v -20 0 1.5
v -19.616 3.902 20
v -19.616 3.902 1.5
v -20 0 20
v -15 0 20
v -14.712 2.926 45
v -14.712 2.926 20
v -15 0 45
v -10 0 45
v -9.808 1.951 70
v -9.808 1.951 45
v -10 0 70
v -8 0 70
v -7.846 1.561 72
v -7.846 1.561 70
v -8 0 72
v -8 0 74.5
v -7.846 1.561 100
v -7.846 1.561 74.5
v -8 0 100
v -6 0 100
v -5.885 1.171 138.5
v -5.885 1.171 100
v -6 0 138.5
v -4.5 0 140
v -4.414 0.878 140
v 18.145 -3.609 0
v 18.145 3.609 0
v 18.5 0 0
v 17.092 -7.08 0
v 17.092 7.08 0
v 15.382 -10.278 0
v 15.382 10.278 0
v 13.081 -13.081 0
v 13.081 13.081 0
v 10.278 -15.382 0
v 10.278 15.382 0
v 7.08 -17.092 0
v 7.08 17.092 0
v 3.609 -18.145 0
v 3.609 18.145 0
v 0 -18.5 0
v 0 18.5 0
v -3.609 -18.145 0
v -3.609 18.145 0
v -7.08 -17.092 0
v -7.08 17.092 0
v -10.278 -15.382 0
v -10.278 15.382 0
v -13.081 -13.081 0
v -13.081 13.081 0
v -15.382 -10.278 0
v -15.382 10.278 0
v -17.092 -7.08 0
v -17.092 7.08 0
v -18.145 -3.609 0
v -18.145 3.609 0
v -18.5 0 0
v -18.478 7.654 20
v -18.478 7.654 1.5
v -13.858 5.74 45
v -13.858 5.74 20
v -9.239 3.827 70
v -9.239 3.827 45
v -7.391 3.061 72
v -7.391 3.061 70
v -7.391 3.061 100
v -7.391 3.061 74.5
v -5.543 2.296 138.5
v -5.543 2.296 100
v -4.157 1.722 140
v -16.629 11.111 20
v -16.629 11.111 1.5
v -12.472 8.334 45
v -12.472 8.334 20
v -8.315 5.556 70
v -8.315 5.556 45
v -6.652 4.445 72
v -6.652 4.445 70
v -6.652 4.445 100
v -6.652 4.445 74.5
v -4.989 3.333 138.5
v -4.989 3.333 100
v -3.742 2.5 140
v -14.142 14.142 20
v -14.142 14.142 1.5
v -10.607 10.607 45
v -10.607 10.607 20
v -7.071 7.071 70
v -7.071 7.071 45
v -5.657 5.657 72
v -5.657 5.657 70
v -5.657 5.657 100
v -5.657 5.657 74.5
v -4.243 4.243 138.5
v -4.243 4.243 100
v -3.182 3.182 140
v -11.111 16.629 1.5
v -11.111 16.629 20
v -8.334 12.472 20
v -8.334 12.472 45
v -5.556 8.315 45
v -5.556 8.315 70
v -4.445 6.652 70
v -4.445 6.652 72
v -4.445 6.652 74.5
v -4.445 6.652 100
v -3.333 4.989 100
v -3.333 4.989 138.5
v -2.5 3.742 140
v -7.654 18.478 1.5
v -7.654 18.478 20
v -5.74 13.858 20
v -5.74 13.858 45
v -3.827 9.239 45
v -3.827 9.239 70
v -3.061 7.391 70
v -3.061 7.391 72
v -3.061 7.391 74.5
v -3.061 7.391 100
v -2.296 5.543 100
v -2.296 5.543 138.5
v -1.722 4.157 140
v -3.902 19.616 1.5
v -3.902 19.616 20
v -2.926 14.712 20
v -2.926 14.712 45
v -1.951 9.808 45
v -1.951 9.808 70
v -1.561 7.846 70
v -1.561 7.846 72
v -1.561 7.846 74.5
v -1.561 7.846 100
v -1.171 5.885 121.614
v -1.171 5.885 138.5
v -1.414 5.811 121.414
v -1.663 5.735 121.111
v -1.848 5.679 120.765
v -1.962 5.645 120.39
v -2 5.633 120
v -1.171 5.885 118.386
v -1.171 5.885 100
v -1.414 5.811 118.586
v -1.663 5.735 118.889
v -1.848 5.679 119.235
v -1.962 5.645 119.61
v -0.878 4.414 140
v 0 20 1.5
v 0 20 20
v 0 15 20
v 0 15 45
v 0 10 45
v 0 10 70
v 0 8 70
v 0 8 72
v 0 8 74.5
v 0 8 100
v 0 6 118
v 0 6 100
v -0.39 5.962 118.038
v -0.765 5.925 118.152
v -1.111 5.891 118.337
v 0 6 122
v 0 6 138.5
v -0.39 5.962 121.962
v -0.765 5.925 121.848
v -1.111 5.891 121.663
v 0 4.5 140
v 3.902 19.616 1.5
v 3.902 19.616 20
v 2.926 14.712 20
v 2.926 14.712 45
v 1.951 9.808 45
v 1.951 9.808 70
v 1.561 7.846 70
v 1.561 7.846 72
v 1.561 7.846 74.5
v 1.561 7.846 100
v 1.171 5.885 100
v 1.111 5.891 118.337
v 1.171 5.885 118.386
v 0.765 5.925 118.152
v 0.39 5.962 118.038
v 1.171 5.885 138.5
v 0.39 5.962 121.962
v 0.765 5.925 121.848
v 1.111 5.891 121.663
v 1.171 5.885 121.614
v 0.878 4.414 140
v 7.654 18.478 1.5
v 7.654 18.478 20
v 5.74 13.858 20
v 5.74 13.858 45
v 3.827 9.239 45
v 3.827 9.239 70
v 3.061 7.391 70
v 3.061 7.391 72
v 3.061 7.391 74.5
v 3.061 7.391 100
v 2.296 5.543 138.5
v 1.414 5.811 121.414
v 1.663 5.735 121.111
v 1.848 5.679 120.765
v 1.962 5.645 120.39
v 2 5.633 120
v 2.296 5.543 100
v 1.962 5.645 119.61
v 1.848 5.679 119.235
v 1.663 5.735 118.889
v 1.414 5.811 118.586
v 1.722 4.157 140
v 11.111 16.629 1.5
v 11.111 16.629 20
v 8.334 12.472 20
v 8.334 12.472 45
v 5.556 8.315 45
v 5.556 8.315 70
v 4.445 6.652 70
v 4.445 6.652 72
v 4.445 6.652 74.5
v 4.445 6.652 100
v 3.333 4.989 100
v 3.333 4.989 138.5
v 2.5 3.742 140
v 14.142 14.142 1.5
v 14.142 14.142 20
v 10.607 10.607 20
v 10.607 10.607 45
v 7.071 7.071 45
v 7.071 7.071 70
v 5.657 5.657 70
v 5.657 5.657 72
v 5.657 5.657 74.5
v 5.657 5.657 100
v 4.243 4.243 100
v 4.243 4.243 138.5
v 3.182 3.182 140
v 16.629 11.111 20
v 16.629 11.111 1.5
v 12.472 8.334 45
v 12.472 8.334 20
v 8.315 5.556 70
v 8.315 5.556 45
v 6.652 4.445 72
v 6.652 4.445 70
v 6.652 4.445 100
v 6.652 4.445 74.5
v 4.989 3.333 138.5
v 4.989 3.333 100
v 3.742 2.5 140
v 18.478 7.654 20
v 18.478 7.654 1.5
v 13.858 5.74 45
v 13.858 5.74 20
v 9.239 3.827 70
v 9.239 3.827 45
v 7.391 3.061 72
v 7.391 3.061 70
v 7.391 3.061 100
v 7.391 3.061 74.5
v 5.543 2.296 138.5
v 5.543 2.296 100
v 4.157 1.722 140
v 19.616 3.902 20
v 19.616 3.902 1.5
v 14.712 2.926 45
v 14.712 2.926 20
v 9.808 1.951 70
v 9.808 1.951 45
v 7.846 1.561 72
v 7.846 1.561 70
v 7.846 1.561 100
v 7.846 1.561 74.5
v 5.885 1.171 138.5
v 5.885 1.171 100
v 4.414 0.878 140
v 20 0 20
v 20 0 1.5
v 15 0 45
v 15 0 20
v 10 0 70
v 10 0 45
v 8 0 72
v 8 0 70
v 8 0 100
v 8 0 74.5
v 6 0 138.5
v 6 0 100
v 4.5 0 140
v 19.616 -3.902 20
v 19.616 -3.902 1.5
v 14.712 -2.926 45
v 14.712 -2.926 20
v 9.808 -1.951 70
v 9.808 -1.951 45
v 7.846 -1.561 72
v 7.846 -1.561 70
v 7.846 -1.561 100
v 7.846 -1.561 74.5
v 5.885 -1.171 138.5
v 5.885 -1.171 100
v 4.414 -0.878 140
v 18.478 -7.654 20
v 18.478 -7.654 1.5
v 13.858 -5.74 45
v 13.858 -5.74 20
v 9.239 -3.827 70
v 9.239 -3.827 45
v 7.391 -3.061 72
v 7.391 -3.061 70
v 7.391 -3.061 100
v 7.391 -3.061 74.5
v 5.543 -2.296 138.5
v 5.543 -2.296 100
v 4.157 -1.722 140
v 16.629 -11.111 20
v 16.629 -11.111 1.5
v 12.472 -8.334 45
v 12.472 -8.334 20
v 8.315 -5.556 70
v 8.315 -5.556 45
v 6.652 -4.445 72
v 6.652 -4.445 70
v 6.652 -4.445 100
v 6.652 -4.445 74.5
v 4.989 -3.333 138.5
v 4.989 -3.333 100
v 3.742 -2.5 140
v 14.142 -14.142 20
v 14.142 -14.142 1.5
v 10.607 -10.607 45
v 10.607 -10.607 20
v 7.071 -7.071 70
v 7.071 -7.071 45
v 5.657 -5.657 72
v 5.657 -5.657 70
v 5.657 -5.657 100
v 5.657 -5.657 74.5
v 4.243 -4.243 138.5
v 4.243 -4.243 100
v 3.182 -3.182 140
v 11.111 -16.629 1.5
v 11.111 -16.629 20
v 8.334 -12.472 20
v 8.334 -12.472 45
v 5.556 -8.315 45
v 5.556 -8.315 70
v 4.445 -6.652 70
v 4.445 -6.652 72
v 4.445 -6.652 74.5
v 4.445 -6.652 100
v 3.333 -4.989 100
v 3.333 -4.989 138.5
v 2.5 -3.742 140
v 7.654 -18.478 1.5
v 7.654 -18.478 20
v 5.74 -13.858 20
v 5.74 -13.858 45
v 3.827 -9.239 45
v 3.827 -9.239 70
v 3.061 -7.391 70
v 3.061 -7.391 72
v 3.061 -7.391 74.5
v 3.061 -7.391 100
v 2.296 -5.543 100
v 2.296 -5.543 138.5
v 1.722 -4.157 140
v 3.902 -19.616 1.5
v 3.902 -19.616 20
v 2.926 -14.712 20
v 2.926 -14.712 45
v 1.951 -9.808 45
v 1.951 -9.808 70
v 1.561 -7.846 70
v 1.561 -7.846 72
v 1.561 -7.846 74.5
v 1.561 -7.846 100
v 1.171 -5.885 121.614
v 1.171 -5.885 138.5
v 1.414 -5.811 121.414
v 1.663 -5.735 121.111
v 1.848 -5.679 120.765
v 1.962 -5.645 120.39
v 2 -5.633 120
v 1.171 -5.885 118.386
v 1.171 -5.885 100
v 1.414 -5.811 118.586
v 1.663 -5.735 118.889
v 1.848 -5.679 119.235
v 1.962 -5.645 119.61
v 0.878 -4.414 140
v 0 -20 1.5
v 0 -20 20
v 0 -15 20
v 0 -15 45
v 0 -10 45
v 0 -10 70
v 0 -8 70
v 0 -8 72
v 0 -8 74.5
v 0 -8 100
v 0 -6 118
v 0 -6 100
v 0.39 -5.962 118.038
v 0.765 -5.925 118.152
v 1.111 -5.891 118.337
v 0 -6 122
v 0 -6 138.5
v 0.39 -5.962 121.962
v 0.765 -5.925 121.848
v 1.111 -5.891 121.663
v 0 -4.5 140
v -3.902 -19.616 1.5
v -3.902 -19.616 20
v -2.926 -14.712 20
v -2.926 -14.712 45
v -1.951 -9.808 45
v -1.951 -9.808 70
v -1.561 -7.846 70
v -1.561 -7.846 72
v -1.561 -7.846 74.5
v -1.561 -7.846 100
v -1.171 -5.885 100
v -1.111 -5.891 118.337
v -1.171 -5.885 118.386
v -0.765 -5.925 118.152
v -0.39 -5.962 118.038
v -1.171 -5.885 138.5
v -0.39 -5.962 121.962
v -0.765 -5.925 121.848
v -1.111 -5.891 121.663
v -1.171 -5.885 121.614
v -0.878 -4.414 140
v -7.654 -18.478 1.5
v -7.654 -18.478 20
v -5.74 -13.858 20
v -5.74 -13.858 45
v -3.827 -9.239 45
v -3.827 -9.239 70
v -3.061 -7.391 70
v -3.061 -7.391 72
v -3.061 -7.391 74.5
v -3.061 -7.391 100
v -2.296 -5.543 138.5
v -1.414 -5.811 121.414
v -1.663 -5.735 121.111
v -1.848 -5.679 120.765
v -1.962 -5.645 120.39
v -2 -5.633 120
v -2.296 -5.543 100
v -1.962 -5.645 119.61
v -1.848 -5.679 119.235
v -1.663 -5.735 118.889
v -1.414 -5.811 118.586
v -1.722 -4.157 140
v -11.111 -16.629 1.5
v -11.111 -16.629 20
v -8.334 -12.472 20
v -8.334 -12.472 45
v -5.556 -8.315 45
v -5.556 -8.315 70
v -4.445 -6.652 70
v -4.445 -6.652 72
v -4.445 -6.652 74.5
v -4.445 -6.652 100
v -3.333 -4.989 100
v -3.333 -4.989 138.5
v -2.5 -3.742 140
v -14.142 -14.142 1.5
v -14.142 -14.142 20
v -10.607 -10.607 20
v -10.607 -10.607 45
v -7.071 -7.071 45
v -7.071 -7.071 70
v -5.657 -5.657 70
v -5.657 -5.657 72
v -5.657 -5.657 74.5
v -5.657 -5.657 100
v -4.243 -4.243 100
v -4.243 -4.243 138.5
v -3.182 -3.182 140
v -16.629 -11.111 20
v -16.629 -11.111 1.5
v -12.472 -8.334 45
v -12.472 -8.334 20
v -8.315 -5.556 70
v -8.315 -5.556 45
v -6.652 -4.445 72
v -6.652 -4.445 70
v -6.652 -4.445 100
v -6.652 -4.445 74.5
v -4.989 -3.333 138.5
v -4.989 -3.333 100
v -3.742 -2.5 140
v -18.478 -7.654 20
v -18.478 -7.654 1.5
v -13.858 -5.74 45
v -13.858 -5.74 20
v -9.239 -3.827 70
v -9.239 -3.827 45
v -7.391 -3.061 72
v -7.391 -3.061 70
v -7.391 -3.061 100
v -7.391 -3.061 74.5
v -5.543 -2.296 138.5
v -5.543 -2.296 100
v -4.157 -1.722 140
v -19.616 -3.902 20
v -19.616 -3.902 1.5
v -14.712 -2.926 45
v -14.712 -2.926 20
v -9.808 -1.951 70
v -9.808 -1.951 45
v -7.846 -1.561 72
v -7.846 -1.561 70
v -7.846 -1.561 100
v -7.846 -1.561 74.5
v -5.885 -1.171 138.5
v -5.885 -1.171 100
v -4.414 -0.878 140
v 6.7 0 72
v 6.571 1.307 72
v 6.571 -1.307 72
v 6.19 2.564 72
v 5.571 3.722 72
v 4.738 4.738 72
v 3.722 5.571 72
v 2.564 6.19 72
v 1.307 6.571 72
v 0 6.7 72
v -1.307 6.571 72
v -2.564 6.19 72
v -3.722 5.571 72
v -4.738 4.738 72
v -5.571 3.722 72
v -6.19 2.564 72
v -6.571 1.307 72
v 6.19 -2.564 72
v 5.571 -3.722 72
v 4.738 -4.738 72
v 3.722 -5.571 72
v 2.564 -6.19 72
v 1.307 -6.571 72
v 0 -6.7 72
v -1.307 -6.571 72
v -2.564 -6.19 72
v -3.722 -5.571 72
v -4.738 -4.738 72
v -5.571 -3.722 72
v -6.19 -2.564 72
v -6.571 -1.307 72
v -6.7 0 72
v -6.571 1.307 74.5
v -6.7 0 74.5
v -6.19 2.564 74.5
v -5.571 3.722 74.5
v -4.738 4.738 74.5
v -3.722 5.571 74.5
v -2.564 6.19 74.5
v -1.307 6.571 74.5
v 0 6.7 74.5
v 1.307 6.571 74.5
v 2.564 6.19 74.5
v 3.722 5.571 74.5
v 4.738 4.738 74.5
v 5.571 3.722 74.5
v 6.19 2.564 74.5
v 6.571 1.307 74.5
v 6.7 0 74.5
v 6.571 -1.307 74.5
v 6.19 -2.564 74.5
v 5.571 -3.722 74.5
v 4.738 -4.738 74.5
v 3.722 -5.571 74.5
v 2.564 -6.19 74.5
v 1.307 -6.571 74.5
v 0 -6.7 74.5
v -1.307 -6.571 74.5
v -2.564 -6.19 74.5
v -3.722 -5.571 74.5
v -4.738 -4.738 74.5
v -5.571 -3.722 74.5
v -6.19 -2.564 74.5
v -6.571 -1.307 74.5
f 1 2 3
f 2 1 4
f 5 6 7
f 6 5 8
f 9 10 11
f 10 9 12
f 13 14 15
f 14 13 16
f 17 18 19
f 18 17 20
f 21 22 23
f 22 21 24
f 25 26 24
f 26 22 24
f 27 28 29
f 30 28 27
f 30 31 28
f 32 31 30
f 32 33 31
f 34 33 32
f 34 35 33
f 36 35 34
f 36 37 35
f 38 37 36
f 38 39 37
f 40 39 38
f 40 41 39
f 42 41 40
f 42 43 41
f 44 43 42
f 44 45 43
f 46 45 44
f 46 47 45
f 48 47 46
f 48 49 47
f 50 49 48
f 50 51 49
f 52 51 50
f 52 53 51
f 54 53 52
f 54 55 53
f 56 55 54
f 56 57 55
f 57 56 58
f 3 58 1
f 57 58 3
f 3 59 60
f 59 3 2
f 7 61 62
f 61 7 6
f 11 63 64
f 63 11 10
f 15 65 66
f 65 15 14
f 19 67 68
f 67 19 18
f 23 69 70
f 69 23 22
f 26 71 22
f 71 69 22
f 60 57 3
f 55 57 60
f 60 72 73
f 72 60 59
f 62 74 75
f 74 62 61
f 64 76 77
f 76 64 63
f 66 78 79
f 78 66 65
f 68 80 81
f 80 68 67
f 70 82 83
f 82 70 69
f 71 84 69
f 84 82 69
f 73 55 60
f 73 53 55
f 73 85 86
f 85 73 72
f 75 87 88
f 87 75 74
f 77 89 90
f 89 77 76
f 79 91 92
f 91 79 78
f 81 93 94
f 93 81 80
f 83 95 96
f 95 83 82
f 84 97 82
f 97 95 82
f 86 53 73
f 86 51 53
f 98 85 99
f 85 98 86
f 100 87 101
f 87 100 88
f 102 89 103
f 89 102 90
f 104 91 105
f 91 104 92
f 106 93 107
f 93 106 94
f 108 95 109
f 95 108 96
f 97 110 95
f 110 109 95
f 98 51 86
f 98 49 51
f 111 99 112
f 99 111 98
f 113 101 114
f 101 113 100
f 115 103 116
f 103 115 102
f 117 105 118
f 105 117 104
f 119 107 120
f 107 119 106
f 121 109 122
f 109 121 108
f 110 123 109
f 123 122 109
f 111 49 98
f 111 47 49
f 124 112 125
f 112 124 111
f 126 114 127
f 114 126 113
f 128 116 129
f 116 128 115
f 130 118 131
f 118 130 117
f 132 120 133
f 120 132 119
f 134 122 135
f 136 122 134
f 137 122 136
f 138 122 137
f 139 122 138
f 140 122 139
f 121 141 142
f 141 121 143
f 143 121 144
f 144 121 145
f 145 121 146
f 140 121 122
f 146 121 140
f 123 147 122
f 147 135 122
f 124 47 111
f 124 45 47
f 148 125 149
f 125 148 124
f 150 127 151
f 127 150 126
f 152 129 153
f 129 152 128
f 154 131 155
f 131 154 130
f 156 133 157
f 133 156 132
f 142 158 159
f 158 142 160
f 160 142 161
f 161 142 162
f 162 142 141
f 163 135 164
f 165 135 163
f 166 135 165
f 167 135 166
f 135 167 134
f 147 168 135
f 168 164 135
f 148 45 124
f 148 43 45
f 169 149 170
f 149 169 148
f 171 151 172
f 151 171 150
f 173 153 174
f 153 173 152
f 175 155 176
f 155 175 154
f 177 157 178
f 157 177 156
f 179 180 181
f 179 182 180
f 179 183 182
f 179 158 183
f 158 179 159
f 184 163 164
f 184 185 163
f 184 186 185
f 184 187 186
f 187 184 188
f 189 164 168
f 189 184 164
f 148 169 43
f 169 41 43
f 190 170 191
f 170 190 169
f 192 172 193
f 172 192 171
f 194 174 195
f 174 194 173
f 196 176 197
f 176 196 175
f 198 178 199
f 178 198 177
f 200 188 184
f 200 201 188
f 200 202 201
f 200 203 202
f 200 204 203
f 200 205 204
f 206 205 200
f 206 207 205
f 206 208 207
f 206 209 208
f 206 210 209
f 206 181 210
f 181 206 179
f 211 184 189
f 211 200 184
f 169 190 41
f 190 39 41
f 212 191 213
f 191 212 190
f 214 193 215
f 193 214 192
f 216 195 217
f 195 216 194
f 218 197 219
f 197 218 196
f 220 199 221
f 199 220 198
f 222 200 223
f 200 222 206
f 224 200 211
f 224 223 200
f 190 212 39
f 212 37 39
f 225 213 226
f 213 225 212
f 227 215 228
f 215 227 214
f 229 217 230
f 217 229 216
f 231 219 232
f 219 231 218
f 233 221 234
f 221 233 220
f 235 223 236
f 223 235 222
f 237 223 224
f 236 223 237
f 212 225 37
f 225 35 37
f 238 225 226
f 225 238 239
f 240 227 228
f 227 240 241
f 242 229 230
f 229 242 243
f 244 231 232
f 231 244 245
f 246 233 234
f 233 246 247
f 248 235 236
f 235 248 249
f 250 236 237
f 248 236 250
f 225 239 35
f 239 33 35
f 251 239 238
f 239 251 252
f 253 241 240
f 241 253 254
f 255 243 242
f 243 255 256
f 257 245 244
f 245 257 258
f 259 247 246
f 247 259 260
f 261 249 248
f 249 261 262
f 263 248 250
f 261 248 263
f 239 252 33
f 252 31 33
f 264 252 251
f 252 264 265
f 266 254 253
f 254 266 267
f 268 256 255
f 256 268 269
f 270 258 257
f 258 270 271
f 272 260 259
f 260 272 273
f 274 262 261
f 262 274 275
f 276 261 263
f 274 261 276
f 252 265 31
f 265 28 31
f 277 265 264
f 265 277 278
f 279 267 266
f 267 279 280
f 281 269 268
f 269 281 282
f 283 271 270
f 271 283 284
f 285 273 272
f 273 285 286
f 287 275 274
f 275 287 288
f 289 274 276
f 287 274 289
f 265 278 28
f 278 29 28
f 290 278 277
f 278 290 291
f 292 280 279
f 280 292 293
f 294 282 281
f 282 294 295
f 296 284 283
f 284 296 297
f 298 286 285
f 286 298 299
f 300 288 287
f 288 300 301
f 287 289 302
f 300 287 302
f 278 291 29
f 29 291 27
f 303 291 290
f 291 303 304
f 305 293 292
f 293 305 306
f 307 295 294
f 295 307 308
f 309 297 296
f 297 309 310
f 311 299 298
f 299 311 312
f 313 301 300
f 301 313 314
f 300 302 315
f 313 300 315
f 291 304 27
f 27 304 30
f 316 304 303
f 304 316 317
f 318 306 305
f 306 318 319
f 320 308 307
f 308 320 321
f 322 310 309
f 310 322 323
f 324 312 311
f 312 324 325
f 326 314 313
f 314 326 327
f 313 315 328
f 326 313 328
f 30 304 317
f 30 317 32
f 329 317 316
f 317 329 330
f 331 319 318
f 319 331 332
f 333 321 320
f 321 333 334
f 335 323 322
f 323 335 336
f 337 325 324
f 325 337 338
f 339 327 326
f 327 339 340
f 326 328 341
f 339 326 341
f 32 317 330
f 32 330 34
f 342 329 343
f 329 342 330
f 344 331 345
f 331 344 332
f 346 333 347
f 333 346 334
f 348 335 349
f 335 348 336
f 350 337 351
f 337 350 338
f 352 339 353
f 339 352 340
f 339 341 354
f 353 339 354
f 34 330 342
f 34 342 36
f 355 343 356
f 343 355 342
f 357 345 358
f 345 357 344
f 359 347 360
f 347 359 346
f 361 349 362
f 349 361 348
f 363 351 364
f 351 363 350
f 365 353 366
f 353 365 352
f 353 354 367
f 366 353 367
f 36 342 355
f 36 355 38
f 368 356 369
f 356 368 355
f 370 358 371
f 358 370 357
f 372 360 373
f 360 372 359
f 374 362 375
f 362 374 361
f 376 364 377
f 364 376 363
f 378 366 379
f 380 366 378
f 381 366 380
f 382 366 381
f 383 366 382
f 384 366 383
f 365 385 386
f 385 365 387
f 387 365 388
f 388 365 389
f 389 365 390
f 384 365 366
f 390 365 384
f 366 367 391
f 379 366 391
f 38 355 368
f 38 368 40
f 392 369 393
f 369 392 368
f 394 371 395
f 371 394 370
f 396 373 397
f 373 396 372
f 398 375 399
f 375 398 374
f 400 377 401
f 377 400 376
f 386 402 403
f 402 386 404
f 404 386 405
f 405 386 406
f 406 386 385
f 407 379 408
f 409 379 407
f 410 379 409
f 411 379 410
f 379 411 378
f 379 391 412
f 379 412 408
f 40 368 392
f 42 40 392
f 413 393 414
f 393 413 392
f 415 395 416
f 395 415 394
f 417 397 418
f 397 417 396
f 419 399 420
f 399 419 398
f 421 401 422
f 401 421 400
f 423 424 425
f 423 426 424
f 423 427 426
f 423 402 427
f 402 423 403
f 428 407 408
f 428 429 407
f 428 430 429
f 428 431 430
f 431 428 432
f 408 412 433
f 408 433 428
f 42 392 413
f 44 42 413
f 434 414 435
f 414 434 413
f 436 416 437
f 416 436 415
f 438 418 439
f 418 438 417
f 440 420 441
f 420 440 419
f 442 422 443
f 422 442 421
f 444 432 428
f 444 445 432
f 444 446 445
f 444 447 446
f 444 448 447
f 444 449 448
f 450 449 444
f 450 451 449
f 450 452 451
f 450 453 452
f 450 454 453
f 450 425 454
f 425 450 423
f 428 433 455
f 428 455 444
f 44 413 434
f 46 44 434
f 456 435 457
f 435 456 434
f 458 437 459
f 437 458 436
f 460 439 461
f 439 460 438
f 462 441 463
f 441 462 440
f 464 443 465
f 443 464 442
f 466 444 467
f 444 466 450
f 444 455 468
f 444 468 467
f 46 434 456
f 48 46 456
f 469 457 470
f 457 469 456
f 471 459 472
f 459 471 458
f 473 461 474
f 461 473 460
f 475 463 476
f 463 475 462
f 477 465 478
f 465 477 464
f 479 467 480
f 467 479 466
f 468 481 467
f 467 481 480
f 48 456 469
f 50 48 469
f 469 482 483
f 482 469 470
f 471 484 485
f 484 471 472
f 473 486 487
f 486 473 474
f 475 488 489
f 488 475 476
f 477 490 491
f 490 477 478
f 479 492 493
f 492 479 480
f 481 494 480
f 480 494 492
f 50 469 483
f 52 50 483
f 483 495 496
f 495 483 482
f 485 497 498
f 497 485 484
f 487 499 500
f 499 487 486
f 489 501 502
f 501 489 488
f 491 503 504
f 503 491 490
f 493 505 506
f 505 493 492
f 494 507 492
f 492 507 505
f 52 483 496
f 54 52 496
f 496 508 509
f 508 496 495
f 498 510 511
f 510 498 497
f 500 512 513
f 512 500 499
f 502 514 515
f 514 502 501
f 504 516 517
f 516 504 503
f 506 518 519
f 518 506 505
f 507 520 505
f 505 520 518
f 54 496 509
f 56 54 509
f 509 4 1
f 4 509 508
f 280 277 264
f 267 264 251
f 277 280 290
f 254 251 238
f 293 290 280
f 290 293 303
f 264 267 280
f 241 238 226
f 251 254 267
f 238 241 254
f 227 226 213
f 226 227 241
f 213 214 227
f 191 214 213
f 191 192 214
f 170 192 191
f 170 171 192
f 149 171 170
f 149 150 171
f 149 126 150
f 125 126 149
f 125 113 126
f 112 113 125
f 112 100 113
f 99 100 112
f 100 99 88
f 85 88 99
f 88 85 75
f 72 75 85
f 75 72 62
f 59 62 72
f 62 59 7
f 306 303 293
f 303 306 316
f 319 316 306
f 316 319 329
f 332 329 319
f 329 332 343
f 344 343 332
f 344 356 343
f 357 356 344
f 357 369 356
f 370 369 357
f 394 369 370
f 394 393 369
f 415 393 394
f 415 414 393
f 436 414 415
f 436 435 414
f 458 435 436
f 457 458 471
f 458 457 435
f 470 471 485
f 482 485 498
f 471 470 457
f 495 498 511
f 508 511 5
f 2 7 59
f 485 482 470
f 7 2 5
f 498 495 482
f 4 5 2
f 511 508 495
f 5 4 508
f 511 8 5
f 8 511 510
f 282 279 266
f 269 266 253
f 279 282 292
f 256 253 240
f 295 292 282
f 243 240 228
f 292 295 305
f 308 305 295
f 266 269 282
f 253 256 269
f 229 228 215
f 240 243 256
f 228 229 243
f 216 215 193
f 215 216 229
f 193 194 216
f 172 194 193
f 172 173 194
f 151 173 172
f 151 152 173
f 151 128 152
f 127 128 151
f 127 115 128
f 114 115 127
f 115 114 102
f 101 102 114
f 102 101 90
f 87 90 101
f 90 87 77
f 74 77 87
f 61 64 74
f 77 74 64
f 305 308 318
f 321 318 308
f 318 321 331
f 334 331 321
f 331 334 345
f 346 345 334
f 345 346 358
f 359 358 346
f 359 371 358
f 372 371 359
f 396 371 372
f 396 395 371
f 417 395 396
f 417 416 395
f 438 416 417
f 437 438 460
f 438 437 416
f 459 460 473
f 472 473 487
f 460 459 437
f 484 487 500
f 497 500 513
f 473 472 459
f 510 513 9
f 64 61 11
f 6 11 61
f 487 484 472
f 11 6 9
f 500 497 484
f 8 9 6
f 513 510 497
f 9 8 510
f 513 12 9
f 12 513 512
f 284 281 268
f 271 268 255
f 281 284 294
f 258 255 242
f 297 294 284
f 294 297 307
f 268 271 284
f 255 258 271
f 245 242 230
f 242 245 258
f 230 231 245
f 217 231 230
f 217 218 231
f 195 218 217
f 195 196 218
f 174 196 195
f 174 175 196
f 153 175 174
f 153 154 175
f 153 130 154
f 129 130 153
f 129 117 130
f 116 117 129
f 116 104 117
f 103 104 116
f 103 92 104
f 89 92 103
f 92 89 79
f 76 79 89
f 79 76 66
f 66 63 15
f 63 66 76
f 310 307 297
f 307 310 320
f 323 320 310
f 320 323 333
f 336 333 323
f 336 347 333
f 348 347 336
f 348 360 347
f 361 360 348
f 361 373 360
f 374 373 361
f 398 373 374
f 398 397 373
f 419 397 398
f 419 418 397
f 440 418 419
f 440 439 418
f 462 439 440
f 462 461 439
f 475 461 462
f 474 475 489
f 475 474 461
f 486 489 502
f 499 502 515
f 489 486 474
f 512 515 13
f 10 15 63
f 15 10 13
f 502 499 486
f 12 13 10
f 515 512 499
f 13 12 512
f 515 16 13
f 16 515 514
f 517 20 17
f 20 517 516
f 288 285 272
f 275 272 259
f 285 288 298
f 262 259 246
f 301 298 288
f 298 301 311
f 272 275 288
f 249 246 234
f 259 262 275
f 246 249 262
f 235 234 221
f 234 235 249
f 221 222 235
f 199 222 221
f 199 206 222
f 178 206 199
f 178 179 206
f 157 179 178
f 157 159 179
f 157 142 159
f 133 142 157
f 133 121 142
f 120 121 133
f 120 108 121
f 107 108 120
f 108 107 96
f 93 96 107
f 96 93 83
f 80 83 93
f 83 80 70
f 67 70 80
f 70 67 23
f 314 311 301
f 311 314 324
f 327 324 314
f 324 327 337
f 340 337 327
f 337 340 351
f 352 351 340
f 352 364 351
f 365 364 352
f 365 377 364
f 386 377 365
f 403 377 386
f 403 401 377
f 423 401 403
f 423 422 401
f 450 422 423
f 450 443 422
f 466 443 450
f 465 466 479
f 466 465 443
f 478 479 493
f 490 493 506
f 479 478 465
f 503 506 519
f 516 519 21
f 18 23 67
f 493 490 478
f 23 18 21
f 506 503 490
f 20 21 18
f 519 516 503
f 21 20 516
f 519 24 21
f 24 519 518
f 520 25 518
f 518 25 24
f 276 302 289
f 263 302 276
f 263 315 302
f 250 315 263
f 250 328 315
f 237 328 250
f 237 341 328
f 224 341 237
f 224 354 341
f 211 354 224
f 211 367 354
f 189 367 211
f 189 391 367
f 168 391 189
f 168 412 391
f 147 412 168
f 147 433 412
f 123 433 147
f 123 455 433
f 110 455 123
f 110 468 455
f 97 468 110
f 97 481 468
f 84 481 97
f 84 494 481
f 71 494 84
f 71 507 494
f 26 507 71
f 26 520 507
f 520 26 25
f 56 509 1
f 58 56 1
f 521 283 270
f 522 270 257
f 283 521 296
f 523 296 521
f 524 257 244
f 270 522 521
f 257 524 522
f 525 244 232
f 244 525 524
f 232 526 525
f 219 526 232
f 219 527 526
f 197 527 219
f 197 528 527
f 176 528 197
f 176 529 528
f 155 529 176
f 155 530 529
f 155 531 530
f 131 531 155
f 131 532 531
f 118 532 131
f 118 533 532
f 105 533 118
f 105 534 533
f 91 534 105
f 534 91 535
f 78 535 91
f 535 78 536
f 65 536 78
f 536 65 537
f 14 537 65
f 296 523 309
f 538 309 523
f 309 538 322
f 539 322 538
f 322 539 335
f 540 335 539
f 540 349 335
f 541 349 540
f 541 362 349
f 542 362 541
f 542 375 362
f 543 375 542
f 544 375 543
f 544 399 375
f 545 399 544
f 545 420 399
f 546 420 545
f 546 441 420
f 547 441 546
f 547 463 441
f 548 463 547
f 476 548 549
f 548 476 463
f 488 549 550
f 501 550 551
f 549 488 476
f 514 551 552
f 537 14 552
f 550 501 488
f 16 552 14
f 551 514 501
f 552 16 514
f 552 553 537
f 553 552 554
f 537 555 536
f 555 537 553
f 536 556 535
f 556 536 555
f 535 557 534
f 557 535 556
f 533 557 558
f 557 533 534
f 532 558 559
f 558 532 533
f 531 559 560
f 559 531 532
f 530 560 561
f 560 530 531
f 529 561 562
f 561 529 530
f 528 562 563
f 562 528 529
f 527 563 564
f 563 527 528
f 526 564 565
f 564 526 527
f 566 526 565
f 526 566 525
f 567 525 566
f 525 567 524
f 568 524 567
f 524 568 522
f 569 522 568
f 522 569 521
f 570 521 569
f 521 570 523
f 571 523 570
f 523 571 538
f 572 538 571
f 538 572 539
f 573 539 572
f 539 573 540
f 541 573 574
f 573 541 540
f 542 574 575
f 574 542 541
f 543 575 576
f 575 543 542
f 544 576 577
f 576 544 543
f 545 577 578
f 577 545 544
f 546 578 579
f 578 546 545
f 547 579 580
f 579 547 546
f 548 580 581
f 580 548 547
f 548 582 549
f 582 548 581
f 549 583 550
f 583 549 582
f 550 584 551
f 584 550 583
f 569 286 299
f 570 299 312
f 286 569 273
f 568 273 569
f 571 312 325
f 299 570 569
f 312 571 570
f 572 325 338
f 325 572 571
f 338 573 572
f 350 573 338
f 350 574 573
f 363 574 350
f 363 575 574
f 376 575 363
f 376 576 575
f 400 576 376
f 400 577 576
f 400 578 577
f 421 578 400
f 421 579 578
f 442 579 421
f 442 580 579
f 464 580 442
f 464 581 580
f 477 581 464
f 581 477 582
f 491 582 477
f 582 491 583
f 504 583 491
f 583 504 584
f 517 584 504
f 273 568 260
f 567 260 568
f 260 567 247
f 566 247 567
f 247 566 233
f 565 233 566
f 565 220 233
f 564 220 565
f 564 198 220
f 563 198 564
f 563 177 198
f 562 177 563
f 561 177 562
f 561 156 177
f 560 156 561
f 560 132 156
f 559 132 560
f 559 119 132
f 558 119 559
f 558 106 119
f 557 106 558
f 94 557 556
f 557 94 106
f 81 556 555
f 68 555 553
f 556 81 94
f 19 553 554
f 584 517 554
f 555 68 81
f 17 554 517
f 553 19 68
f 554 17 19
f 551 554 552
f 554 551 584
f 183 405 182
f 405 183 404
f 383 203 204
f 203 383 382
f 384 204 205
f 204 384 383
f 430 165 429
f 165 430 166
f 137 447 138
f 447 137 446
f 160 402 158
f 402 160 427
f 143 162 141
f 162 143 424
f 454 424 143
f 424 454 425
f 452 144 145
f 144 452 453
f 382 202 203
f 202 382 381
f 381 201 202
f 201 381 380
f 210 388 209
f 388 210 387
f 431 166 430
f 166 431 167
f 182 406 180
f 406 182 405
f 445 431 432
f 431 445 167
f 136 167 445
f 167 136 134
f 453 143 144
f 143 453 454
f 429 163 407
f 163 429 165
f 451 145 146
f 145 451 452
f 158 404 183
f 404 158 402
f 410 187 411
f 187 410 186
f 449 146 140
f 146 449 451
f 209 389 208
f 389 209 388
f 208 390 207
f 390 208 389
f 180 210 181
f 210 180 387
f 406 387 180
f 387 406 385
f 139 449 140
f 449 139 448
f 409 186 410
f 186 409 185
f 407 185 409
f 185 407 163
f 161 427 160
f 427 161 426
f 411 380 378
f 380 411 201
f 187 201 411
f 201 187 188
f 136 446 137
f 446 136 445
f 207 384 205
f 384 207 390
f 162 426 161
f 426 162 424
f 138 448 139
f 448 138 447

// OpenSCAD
$fn = 32;

// ----------------------------------------------------------------------
// Stepped shaft: diameters 40, 30, 20, 16, 12 mm, 140 mm long
// ----------------------------------------------------------------------

// --- parameters (mm) ---
d1 = 40;                  // step 1 diameter
len1 = 20;                // step 1 length
d2 = 30;                  // step 2 diameter
len2 = 25;                // step 2 length
d3 = 20;                  // step 3 diameter
len3 = 25;                // step 3 length
d4 = 16;                  // step 4 diameter
len4 = 30;                // step 4 length
d5 = 12;                  // step 5 diameter
len5 = 40;                // step 5 length
total = 140;              // overall length
chamfer = 1.5;            // end chamfer
groove_r = 8;             // groove radius
groove_z = 72;            // groove position from the end
groove_w = 2.5;           // groove width
groove_d = 1.3;           // groove depth
cross_d = 4;              // cross pin hole
cross_z = 120;            // cross hole position

/* closed turning profile: x is the radius, y is the length */
profile = [[0, 0], [20 - chamfer, 0], [20, chamfer], [20, 20], [15, 20], [15, 45], [10, 45], [10, 70], [8, 70], [8, 100], [6, 100], [6, 138.5], [4.5, 140], [0, 140]];

difference() {
  rotate_extrude() polygon(profile);
  /* circlip groove just behind the shoulder */
  rotate_extrude() translate([groove_r - groove_d, groove_z]) square([groove_d + 1, groove_w]);
  /* cross pin hole through the small step */
  translate([0, 0, cross_z]) rotate([90, 0, 0]) cylinder(h = d5 + 4, d = cross_d, center = true);
}
